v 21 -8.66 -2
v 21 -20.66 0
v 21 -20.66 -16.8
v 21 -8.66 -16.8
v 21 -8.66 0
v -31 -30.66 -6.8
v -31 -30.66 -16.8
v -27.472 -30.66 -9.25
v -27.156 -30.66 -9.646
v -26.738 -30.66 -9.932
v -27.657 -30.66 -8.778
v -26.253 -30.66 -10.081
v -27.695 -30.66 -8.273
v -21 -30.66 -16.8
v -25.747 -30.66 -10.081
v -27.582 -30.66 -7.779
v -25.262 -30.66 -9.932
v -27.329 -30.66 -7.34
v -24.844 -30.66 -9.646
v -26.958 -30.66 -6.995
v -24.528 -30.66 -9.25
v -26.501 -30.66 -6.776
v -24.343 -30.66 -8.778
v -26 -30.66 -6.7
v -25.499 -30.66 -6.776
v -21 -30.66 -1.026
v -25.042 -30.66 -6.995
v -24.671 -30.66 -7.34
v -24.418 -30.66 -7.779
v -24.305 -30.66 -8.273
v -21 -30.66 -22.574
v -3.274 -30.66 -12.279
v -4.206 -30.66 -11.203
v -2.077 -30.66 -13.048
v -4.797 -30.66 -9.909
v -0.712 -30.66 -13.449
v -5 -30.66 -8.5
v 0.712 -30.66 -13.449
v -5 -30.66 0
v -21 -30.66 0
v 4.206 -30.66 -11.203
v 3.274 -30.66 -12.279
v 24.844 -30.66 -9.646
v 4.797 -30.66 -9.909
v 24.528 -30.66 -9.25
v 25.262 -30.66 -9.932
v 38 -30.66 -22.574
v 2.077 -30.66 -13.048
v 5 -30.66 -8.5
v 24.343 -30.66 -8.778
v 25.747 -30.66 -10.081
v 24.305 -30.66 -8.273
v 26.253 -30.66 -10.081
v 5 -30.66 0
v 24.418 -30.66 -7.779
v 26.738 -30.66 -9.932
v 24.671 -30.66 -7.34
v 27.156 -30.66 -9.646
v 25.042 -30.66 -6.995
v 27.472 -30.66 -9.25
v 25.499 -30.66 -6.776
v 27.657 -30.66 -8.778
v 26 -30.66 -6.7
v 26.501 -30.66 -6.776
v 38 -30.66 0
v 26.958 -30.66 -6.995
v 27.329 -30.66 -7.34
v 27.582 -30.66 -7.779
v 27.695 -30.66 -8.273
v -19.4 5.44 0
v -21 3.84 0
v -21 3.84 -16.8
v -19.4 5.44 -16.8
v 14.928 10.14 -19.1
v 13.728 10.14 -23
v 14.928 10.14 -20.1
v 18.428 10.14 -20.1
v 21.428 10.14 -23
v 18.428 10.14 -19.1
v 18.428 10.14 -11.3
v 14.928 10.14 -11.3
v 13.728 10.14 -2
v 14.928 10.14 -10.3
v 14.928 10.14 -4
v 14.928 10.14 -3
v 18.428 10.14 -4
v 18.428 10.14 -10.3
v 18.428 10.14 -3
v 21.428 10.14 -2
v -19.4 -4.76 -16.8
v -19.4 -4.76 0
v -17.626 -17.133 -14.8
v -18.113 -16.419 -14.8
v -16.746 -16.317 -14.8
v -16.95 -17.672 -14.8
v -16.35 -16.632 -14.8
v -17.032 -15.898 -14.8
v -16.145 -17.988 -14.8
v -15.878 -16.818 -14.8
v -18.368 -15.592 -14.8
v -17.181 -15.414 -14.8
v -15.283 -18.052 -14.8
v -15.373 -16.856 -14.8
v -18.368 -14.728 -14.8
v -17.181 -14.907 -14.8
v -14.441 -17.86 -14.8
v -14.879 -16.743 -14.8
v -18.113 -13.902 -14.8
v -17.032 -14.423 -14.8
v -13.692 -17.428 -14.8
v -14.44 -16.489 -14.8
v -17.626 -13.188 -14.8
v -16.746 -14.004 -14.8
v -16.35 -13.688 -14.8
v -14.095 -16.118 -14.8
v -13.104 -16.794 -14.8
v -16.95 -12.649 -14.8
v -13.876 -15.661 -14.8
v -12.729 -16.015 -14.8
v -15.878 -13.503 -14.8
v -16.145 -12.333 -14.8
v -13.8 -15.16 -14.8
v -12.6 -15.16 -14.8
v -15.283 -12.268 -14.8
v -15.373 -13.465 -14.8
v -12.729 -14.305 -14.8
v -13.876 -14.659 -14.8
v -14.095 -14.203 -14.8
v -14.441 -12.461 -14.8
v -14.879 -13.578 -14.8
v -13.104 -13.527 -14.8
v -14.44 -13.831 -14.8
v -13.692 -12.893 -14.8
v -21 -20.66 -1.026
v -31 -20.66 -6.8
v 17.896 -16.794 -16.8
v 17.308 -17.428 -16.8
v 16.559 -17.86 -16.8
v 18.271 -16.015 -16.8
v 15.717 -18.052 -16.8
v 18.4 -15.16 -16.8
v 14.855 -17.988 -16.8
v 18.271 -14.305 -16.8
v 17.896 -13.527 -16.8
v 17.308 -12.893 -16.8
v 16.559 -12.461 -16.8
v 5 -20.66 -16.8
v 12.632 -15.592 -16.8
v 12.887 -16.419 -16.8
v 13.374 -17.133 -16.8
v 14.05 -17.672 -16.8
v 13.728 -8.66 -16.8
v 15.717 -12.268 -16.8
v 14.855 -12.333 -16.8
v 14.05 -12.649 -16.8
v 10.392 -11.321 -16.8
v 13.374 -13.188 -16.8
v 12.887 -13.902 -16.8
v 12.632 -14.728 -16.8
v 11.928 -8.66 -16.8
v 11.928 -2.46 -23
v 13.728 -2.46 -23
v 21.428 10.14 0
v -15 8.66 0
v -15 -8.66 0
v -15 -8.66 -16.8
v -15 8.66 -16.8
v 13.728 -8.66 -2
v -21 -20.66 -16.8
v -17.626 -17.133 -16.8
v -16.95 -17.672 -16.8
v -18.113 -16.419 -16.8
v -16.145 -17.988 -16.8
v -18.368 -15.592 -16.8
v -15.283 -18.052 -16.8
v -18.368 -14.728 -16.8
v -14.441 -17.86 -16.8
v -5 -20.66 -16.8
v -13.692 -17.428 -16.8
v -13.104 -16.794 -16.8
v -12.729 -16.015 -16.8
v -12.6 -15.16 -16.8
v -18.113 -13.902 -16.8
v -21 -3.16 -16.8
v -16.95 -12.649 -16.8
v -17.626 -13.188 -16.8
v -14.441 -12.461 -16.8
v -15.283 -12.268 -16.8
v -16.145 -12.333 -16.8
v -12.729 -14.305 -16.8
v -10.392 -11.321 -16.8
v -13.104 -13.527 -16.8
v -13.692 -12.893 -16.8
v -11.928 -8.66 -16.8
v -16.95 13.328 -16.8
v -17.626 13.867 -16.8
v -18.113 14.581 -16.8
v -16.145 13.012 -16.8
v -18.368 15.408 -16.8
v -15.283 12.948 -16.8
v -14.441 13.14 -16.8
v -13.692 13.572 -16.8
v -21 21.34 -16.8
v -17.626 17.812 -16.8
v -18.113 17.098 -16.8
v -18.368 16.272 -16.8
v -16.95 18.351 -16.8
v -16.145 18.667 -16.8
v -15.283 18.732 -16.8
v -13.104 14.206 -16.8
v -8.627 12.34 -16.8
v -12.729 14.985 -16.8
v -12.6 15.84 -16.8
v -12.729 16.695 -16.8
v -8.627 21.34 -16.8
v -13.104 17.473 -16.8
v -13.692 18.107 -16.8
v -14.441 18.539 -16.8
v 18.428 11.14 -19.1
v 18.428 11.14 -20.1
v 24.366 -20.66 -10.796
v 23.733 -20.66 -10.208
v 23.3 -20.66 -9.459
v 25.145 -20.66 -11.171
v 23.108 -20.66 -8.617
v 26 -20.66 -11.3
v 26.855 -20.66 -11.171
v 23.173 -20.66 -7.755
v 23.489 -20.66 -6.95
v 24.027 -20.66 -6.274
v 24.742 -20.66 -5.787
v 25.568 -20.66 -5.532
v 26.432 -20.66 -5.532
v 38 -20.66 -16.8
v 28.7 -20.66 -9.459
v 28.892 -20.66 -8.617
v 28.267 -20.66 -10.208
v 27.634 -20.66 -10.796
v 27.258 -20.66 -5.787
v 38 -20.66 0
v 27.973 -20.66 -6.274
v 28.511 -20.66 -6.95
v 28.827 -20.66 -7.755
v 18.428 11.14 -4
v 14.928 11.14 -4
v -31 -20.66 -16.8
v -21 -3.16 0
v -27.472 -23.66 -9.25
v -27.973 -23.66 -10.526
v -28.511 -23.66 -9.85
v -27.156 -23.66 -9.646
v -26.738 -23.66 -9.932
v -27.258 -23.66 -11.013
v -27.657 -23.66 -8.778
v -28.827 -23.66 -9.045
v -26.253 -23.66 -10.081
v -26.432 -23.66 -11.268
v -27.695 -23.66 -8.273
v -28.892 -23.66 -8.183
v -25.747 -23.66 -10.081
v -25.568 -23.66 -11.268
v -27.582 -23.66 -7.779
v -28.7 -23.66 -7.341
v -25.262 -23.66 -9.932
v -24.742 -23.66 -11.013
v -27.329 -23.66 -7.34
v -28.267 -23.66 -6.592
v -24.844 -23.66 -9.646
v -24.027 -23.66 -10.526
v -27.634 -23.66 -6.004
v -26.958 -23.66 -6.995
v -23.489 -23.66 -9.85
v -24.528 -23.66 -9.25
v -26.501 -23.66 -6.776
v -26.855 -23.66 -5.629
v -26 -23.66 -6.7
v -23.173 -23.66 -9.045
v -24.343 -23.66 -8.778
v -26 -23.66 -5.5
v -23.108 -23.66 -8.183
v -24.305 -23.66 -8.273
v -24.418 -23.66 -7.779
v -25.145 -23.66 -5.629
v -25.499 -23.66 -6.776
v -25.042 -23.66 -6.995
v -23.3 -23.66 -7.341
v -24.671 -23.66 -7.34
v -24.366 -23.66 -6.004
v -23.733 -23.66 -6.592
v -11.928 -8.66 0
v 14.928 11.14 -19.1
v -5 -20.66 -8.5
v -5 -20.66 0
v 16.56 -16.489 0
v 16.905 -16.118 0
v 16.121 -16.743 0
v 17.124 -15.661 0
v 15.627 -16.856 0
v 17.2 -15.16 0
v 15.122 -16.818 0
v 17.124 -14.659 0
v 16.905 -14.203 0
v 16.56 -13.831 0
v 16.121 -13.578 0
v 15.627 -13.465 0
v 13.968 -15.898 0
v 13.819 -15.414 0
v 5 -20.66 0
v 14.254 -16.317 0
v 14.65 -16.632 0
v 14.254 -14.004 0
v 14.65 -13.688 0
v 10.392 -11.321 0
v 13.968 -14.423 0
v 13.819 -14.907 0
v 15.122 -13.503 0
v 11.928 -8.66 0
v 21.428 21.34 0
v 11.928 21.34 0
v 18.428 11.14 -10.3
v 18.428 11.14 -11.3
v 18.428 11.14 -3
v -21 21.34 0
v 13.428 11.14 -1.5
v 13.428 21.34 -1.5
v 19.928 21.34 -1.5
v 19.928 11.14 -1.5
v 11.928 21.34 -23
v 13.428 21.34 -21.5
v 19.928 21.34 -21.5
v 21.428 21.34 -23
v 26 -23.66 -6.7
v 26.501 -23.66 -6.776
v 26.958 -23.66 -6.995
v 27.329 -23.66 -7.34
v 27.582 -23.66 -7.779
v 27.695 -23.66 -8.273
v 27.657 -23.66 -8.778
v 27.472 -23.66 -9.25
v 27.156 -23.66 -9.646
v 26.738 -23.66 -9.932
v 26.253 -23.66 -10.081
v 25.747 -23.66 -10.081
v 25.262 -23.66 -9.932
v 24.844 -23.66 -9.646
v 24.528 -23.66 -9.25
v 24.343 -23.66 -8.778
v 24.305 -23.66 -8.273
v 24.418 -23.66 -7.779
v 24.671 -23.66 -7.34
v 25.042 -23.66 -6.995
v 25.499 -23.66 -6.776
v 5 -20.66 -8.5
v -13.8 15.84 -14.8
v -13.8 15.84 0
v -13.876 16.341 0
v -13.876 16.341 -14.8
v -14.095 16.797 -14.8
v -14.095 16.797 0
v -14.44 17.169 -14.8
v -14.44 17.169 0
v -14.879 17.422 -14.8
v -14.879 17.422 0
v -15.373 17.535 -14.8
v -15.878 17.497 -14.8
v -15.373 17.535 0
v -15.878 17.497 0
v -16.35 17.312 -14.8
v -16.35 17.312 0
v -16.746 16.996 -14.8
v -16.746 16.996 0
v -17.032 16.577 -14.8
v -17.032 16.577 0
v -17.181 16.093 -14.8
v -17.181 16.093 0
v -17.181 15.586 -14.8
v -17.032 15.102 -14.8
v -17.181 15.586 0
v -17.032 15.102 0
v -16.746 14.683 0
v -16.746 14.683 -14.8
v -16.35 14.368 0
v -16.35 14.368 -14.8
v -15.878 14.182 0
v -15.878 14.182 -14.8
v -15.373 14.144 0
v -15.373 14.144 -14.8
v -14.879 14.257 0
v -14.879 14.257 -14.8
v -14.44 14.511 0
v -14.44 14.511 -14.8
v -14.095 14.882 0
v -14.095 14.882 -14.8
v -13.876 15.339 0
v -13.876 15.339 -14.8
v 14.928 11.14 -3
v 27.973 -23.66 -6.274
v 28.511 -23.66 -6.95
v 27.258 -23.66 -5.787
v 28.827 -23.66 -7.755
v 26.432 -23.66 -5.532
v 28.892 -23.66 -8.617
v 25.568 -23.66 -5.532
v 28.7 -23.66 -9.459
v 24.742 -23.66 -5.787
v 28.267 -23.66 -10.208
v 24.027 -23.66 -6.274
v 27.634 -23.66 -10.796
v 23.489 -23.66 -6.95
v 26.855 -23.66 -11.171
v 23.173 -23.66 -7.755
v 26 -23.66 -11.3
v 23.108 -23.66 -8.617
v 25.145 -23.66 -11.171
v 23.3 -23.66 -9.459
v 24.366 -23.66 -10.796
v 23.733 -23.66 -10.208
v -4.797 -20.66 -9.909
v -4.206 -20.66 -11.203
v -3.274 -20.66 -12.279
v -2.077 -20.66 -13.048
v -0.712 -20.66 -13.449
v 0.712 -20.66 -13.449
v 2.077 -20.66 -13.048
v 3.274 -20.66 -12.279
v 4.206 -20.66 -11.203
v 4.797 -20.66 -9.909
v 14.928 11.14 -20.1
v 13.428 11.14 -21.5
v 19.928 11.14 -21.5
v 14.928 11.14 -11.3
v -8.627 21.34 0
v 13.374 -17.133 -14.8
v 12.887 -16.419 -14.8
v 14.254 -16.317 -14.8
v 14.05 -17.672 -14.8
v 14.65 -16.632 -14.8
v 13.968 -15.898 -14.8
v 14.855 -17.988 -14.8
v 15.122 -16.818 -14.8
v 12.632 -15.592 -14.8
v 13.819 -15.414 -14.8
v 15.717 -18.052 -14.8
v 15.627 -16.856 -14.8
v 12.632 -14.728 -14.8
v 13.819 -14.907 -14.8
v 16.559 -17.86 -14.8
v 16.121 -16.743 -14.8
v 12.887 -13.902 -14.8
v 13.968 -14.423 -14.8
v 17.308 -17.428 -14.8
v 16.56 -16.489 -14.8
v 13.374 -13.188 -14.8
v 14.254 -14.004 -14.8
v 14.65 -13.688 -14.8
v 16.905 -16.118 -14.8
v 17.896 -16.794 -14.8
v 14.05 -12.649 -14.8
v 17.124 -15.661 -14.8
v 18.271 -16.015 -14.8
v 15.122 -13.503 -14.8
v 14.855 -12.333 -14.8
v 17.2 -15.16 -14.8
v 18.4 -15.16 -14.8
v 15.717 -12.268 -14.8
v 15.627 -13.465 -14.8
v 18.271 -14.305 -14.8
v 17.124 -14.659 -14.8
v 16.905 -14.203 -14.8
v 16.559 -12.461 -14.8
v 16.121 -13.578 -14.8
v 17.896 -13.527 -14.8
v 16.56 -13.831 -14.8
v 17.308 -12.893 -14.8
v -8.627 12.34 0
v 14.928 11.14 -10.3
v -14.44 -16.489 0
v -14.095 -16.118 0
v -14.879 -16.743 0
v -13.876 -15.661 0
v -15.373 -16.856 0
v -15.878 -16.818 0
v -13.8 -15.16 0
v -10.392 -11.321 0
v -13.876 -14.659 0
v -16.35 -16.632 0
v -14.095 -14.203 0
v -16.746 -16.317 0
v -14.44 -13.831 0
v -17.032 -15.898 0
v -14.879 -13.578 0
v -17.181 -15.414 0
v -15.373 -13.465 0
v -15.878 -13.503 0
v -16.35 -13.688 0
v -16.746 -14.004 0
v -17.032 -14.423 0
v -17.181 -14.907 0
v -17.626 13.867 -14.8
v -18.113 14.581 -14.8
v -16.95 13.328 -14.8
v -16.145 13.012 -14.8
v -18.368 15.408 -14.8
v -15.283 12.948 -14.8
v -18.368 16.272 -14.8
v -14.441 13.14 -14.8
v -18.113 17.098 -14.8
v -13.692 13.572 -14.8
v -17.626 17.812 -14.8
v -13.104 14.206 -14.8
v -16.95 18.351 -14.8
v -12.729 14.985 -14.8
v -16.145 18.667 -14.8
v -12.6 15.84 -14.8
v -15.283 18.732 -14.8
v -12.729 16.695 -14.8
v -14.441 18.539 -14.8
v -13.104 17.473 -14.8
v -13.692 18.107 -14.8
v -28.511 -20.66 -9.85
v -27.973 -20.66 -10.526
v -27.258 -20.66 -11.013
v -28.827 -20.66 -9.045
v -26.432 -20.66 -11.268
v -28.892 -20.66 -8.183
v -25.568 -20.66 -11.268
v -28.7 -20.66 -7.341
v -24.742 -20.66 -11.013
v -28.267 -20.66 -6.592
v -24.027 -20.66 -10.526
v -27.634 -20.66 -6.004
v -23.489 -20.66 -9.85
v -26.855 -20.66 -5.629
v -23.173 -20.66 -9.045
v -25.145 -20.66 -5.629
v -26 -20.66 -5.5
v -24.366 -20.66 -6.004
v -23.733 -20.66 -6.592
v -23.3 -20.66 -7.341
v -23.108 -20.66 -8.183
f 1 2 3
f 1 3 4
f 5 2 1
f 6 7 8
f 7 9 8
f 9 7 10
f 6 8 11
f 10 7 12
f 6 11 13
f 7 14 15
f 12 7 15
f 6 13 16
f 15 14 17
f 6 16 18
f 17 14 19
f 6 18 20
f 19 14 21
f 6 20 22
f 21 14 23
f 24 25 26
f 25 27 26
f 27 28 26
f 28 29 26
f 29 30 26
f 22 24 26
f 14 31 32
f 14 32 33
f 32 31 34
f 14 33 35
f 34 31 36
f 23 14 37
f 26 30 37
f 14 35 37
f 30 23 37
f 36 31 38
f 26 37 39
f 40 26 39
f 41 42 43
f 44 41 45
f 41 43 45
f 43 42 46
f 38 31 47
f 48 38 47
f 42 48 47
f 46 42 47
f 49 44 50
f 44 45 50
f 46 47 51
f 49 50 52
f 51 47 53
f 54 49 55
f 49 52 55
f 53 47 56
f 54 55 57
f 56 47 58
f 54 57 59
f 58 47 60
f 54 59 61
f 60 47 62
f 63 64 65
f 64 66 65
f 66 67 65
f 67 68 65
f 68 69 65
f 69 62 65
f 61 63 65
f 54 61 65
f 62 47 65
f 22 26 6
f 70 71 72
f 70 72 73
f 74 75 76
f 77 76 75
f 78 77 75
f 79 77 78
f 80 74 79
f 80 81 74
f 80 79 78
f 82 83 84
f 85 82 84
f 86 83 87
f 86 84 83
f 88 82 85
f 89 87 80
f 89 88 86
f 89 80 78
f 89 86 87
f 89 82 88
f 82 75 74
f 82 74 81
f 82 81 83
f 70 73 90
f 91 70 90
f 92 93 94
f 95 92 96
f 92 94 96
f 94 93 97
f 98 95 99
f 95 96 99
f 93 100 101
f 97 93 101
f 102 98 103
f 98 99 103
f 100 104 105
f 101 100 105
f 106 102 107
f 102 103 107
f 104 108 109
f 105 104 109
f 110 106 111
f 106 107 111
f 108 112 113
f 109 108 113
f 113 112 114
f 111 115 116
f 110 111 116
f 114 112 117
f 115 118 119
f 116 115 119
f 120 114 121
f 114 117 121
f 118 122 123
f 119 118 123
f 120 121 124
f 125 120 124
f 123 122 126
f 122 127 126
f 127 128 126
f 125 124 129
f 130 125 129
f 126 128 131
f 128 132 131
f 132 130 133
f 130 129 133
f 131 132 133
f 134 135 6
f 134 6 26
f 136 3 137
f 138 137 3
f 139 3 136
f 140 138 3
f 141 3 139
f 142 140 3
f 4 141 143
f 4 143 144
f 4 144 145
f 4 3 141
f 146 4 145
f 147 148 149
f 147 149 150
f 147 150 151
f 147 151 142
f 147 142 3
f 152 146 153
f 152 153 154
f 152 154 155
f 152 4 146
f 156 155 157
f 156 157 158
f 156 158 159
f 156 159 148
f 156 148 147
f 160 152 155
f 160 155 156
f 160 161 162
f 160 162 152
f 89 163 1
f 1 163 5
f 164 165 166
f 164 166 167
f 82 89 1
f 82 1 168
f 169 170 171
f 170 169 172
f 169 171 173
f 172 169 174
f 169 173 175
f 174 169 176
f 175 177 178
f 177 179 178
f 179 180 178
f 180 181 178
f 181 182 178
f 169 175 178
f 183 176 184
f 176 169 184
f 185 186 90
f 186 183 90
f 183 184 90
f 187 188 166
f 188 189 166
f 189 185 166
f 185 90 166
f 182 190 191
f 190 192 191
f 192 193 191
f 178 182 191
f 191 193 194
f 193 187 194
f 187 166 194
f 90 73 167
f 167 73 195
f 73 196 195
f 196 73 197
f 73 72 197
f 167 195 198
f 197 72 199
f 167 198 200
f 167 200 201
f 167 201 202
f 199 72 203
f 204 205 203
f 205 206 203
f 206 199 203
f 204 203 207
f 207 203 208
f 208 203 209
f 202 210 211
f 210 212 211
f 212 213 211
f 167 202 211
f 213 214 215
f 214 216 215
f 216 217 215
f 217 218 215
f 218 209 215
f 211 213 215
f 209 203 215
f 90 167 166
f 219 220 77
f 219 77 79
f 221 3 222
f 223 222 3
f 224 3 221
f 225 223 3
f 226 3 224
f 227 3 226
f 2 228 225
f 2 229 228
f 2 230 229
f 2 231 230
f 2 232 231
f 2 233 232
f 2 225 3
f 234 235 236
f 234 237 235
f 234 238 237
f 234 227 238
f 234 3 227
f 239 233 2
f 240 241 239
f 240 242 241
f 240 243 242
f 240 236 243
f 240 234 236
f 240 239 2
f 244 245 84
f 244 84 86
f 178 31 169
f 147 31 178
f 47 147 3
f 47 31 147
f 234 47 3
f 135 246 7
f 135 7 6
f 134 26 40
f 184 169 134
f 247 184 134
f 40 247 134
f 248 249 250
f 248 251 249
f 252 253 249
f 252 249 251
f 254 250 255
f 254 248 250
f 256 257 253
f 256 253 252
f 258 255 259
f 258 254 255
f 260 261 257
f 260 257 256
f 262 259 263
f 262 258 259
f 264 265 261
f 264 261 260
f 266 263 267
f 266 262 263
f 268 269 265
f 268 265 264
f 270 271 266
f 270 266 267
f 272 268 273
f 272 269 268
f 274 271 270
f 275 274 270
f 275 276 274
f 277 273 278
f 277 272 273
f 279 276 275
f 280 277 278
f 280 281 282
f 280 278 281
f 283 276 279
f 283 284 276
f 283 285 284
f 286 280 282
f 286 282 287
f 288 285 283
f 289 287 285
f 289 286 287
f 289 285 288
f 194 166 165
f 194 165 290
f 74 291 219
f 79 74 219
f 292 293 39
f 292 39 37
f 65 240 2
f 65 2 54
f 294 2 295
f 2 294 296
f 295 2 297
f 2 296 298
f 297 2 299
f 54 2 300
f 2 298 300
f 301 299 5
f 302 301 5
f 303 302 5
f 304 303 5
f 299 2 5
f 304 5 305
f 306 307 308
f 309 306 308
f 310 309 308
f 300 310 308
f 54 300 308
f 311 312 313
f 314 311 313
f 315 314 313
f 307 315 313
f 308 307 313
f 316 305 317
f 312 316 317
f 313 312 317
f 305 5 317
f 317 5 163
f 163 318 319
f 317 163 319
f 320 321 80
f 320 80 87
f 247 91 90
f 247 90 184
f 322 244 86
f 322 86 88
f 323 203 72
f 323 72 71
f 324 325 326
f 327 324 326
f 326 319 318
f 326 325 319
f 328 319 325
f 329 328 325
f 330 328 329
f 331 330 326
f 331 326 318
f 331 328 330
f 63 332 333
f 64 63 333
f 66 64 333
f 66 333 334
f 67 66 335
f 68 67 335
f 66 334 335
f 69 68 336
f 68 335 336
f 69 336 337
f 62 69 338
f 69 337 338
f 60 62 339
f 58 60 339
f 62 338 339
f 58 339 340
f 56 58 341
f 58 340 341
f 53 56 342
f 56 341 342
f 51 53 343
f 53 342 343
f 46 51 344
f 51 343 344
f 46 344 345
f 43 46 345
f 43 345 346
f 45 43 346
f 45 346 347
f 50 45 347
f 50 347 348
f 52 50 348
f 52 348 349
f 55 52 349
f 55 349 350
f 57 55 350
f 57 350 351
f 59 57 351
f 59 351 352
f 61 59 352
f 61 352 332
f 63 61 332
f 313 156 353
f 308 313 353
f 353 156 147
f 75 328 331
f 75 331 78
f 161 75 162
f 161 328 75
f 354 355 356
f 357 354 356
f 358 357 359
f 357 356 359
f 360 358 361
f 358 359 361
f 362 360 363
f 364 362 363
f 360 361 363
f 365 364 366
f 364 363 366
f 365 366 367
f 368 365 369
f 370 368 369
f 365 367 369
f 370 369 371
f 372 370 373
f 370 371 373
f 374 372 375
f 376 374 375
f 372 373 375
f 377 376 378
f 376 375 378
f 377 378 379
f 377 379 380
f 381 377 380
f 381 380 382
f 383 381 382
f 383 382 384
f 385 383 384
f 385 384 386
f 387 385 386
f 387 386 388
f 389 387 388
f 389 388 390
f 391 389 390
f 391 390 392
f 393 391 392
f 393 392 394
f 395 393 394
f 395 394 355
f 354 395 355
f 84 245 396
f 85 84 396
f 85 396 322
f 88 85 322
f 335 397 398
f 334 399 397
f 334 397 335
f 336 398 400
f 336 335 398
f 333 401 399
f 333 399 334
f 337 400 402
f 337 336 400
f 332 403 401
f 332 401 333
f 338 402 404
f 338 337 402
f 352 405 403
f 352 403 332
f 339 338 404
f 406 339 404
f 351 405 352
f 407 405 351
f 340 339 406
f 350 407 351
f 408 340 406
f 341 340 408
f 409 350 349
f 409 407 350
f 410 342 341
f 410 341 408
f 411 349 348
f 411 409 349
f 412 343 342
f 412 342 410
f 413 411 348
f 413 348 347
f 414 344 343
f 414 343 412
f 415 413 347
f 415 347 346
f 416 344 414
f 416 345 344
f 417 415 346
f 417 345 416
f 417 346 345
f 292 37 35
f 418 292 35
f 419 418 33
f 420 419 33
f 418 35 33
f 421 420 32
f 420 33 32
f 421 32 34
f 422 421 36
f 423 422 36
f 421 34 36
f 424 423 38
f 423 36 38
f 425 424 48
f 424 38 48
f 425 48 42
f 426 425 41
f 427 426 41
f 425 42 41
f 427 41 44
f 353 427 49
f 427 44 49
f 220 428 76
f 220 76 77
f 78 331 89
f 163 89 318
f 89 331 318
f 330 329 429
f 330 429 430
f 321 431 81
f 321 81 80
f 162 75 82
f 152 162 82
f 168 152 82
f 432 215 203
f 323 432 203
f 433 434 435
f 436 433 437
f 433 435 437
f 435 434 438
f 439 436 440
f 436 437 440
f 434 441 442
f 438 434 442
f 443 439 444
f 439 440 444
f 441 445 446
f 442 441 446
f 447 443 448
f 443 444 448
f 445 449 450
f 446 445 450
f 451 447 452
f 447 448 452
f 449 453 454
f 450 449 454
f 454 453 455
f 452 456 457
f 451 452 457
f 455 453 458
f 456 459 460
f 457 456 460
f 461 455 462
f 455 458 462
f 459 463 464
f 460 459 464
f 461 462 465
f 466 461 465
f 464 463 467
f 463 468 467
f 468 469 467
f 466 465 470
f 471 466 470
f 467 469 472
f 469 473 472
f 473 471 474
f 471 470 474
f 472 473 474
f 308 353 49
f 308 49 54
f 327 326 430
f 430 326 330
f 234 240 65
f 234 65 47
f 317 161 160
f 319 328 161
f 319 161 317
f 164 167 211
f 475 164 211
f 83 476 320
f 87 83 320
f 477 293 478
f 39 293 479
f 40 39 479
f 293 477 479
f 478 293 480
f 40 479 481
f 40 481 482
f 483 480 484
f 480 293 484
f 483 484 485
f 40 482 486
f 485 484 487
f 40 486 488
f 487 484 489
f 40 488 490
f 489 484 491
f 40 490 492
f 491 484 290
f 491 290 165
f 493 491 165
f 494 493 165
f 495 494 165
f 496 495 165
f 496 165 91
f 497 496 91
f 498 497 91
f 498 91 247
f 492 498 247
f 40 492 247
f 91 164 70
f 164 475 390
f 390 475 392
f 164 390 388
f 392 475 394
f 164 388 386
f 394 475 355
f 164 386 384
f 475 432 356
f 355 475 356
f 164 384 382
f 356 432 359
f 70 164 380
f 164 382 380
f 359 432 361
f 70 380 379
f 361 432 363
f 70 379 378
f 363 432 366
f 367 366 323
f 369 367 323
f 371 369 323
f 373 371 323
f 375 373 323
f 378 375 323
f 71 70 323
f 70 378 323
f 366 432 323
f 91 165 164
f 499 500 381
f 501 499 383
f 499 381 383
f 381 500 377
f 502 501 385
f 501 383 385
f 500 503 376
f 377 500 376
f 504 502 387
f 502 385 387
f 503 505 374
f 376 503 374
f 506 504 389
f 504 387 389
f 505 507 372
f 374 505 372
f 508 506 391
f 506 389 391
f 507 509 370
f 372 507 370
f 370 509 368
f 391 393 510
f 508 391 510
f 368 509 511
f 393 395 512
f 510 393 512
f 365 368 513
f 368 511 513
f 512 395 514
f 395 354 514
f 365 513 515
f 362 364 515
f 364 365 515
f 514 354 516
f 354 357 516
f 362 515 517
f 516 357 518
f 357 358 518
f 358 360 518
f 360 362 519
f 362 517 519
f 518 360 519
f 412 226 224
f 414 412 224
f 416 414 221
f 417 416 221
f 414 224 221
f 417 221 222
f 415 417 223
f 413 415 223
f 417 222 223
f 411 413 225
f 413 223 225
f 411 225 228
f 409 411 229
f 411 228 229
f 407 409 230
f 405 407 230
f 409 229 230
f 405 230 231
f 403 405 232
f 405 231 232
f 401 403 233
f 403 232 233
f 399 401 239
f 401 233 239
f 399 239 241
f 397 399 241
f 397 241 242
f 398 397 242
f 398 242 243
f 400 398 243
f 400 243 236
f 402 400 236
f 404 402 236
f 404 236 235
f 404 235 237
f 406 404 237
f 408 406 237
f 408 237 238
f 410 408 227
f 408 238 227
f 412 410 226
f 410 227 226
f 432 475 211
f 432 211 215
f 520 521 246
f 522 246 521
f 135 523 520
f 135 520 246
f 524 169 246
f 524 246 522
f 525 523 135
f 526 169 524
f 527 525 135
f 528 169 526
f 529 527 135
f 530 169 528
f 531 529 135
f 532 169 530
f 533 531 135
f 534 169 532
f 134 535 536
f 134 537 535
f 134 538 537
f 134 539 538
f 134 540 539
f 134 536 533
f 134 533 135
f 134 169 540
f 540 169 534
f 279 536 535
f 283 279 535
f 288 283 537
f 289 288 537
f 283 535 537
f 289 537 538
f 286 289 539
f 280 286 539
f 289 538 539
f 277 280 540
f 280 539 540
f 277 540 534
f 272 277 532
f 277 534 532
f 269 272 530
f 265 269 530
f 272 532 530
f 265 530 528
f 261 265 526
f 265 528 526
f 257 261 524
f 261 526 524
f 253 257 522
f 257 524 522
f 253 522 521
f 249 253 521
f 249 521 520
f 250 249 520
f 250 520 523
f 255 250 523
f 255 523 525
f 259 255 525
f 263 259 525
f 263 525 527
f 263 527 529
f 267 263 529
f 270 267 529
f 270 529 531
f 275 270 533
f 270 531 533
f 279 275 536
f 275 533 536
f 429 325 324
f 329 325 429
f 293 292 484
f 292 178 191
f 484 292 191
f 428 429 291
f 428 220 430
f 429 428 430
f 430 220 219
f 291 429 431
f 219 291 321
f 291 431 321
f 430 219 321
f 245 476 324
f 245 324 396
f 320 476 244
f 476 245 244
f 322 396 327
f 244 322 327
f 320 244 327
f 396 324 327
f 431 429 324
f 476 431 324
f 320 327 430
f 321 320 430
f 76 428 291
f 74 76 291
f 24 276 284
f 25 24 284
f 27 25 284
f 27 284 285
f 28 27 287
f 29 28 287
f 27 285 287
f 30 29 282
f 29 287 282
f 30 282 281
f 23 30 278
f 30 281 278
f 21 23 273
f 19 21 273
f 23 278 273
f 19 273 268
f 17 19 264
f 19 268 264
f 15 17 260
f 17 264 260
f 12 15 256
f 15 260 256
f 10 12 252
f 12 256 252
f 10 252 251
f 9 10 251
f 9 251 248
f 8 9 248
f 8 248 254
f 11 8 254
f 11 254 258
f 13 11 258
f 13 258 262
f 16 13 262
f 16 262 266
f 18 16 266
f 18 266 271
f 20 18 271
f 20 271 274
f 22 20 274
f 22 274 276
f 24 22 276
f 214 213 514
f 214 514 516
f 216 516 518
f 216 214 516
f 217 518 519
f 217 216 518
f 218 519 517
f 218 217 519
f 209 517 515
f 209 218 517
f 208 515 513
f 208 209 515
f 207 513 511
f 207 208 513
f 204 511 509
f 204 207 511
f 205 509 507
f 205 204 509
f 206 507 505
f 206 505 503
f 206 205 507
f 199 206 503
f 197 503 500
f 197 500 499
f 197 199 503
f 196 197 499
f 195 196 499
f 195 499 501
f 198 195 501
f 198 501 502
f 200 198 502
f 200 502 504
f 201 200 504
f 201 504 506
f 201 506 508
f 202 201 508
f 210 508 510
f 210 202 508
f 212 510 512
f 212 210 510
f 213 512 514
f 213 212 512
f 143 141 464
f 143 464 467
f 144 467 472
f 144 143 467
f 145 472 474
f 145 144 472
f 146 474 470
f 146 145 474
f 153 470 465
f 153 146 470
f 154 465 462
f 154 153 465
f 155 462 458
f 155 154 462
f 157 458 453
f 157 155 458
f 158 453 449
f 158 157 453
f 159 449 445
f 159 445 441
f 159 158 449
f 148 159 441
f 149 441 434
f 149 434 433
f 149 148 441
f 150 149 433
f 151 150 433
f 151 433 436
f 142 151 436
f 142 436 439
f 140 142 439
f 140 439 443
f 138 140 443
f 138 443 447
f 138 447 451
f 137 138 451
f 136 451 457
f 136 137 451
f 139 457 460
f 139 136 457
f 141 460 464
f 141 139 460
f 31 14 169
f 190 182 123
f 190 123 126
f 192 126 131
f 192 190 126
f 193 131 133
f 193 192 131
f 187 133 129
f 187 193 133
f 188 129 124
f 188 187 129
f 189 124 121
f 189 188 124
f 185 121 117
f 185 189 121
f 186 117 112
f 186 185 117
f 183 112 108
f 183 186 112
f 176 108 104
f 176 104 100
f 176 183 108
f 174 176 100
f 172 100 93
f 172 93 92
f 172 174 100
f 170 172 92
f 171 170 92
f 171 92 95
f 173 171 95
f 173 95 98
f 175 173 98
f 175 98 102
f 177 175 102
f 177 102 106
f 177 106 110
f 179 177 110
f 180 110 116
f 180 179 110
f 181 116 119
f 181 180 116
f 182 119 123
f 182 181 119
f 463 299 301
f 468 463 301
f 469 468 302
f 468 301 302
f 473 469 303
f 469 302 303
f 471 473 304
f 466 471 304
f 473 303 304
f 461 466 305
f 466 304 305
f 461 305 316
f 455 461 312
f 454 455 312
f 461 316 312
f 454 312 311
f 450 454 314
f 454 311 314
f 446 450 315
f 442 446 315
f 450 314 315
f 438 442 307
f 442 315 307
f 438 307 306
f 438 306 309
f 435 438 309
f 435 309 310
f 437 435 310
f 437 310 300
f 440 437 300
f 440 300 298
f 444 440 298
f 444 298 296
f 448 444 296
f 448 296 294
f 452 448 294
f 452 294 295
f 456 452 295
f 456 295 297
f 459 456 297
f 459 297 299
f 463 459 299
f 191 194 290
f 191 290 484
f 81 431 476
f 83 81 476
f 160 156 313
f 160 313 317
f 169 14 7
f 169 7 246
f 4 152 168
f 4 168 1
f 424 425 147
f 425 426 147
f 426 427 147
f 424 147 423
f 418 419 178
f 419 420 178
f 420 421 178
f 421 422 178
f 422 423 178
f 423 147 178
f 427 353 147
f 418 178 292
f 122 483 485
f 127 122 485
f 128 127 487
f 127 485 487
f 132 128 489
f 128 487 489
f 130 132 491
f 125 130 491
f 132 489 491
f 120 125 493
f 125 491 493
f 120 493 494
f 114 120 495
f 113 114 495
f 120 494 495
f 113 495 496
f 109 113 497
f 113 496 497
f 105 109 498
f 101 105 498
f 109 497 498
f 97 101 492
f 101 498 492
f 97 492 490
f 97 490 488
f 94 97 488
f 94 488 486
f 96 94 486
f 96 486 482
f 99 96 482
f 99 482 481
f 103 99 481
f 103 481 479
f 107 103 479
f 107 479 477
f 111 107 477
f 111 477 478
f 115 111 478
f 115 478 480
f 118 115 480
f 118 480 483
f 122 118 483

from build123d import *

# Parameters (mm, degrees)
SKETCH1_R                       = 1.7
BOSS_EXTRUDE1_DEPTH             = 16.8
BOSS_EXTRUDE2_DEPTH             = 17
BOSS_EXTRUDE2_DEPTH_BACK        = 42
SKETCH3_W                       = 16.8
SKETCH3_H                       = 10
BOSS_EXTRUDE3_DEPTH             = 10
SKETCH4_R                       = 1.7
CUT_EXTRUDE1_DEPTH              = 11
SKETCH4_3_R                     = 2.9
SKETCH4_3_R_2                   = 1.7
CUT_EXTRUDE2_DEPTH              = 3
CUT_EXTRUDE3_START              = -16.8
SKETCH6_R                       = 2.9
CUT_EXTRUDE3_DEPTH              = 2
CUT_EXTRUDE4_DEPTH              = 11
SKIZZE1_R                       = 5
SCHNITT_LINEAR_AUSTRAGEN1_DEPTH = 53
SCHNITT_LINEAR_AUSTRAGEN2_DEPTH = 17.8
AUFSATZ_LINEAR_AUSTRAGEN1_DEPTH = 16.8
SCHNITT_LINEAR_AUSTRAGEN3_DEPTH = 11
SKETCH13_W                      = 9.5
SKETCH13_H                      = 23
SKETCH13_W_2                    = 6.5
SKETCH13_H_2                    = 20
BOSS_EXTRUDE7_DEPTH             = 10.2
SKETCH14_W                      = 9.5
SKETCH14_H                      = 23
SKETCH14_W_2                    = 3.5
SKETCH14_H_2                    = 1
BOSS_EXTRUDE8_DEPTH             = 1
BOSS_EXTRUDE9_DEPTH             = 2
BOSS_EXTRUDE10_DEPTH            = 1.8
CUT_EXTRUDE10_DEPTH             = 17.8


with BuildPart() as part:
    # Sketch1 → Boss-Extrude1 (new body)
    with BuildSketch(Plane.XY):
        Polygon((-21, 21.339745962), (-21, -20.660254038), (21, -20.660254038), (21, -8.660254038), (15, -8.660254038), (0, -17.320508076), (-15, -8.660254038), (-15, 8.660254038), (-8.626933041, 12.339745962), (-8.626933041, 21.339745962), align=None)
        with Locations((-15.5, -15.160254038)):
            Circle(SKETCH1_R, mode=Mode.SUBTRACT)
        with Locations((15.5, -15.160254038)):
            Circle(SKETCH1_R, mode=Mode.SUBTRACT)
        with Locations((-15.5, 15.839745962)):
            Circle(SKETCH1_R, mode=Mode.SUBTRACT)
    extrude(amount=-BOSS_EXTRUDE1_DEPTH)



with BuildPart() as body_2:
    # Sketch2 → Boss-Extrude2 (new body, two sides)
    with BuildSketch(Plane(origin=(21, 0, 0), x_dir=(0, 0, -1), z_dir=(1, 0, 0))) as boss_extrude2_sk:
        Polygon((0, -20.660254038), (0, -30.660254038), (22.573502692, -30.660254038), (16.8, -20.660254038), align=None)
    extrude(amount=BOSS_EXTRUDE2_DEPTH)
    extrude(boss_extrude2_sk.sketch, amount=-BOSS_EXTRUDE2_DEPTH_BACK)


with BuildPart() as part_1:
    add(part.part)

    add(body_2.part)  # Boss-Extrude3 merges body 2
    # Sketch3 → Boss-Extrude3 (add)
    with BuildSketch(Plane.ZY.offset(21)):
        with Locations((-8.4, -25.660254038)):
            Rectangle(SKETCH3_W, SKETCH3_H)
    extrude(amount=BOSS_EXTRUDE3_DEPTH)

    # Sketch4 → Cut-Extrude1 (cut, through all)
    with BuildSketch(Plane(origin=(0, -20.660254038, 0), x_dir=(1, 0, 0), z_dir=(0, 1, 0))):
        with Locations(Location((-26, 8.4, 0), (0, 0, 270))):  # turned: the seam where the file's is
            Circle(SKETCH4_R)
        with Locations(Location((26, 8.4, 0), (0, 0, 270))):  # turned: the seam where the file's is
            Circle(SKETCH4_R)
    extrude(amount=-CUT_EXTRUDE1_DEPTH, mode=Mode.SUBTRACT)

    # Sketch4_3 → Cut-Extrude2 (cut)
    with BuildSketch(Plane(origin=(0, -20.660254038, 0), x_dir=(1, 0, 0), z_dir=(0, 1, 0))):
        with Locations(Location((-26, 8.4, 0), (0, 0, 270))):  # turned: the seam where the file's is
            Circle(SKETCH4_3_R)
        with Locations(Location((-26, 8.4, 0), (0, 0, 270))):  # turned: the seam where the file's is
            Circle(SKETCH4_3_R_2, mode=Mode.SUBTRACT)
        with Locations(Location((26, 8.4, 0), (0, 0, 90))):  # turned: the seam where the file's is
            Circle(SKETCH4_3_R)
        with Locations(Location((26, 8.4, 0), (0, 0, 270))):  # turned: the seam where the file's is
            Circle(SKETCH4_3_R_2, mode=Mode.SUBTRACT)
    extrude(amount=-CUT_EXTRUDE2_DEPTH, mode=Mode.SUBTRACT)

    # Sketch6 → Cut-Extrude3 (cut)
    with BuildSketch(Plane.XY.offset(CUT_EXTRUDE3_START)):
        with Locations((-15.5, 15.839745962)):
            Circle(SKETCH6_R)
        with Locations((-15.5, -15.160254038)):
            Circle(SKETCH6_R)
        with Locations((15.5, -15.160254038)):
            Circle(SKETCH6_R)
    extrude(amount=CUT_EXTRUDE3_DEPTH, mode=Mode.SUBTRACT)

    # Sketch5 → Cut-Extrude4 (cut, through all)
    with BuildSketch(Plane(origin=(0, -20.660254038, 0), x_dir=(1, 0, 0), z_dir=(0, 1, 0))):
        Polygon((-31, 0), (-31, 6.8), (-21, 1.026497308), (-21, 0), align=None)
    extrude(amount=-CUT_EXTRUDE4_DEPTH, mode=Mode.SUBTRACT)

    # Skizze1 → Schnitt-Linear austragen1 (cut, through all)
    with BuildSketch(Plane.XZ.offset(30.660254038)):
        with Locations((0, -8.5)):
            Circle(SKIZZE1_R)
    extrude(amount=-SCHNITT_LINEAR_AUSTRAGEN1_DEPTH, mode=Mode.SUBTRACT)

    # Skizze2 → Schnitt-Linear austragen2 (cut, through all)
    with BuildSketch(Plane(origin=(0, 0, -16.8), x_dir=(-1, 0, 0), z_dir=(0, 0, -1))):
        Polygon((-5, -20.660254038), (5, -20.660254038), (10.392304845, -11.320508076), (0, -17.320508076), (-10.392304845, -11.320508076), align=None)
    extrude(amount=-SCHNITT_LINEAR_AUSTRAGEN2_DEPTH, mode=Mode.SUBTRACT)

    # Skizze2_3 → Aufsatz-Linear austragen1 (add)
    with BuildSketch(Plane(origin=(0, 0, -16.8), x_dir=(-1, 0, 0), z_dir=(0, 0, -1))):
        Polygon((-15, -8.660254038), (-10.392304845, -11.320508076), (-11.92820323, -8.660254038), align=None)
        Polygon((11.92820323, -8.660254038), (10.392304845, -11.320508076), (15, -8.660254038), align=None)
    extrude(amount=-AUFSATZ_LINEAR_AUSTRAGEN1_DEPTH)

    # Skizze3 → Schnitt-Linear austragen3 (cut, through all)
    with BuildSketch(Plane(origin=(0, -20.660254038, 0), x_dir=(1, 0, 0), z_dir=(0, 1, 0))):
        with BuildLine():
            Line((5, 0), (-5, 0))
            Line((-5, 0), (-5, 8.5))
            ThreePointArc((-5, 8.5), (0, 3.5), (5, 8.5))
            Line((5, 8.5), (5, 0))
        make_face()
    extrude(amount=-SCHNITT_LINEAR_AUSTRAGEN3_DEPTH, mode=Mode.SUBTRACT)



with BuildPart() as body_2_2:
    # Sketch13 → Boss-Extrude7 (new body)
    with BuildSketch(Plane(origin=(0, 21.339745962, 0), x_dir=(1, 0, 0), z_dir=(0, 1, 0))):
        with Locations((16.67820323, 11.5)):
            Rectangle(SKETCH13_W, SKETCH13_H)
        with Locations((16.67820323, 11.5)):
            Rectangle(SKETCH13_W_2, SKETCH13_H_2, mode=Mode.SUBTRACT)
    extrude(amount=-BOSS_EXTRUDE7_DEPTH)

    # Sketch14 → Boss-Extrude8 (add)
    with BuildSketch(Plane.XZ.offset(-11.139745962)):
        with Locations((16.67820323, -11.5)):
            Rectangle(SKETCH14_W, SKETCH14_H)
        with Locations((16.67820323, -19.6)):
            Rectangle(SKETCH14_W_2, SKETCH14_H_2, mode=Mode.SUBTRACT)
        with Locations((16.67820323, -10.8)):
            Rectangle(SKETCH14_W_2, SKETCH14_H_2, mode=Mode.SUBTRACT)
        with Locations((16.67820323, -3.5)):
            Rectangle(SKETCH14_W_2, SKETCH14_H_2, mode=Mode.SUBTRACT)
    extrude(amount=BOSS_EXTRUDE8_DEPTH)


with BuildPart() as part_2:
    add(part_1.part)

    add(body_2_2.part)  # Boss-Extrude9 merges body 2 2
    # Sketch15 → Boss-Extrude9 (add)
    with BuildSketch(Plane.XY):
        Polygon((21.42820323, 10.139745962), (21, -8.660254038), (11.92820323, -8.660254038), (11.92820323, 10.139745962), align=None)
    extrude(amount=-BOSS_EXTRUDE9_DEPTH)

    # Sketch16 → Boss-Extrude10 (add)
    with BuildSketch(Plane.ZY.offset(-11.92820323)):
        Polygon((-2, 10.139745962), (-23, 10.139745962), (-23, -2.460254038), (-16.8, -8.660254038), (-2, -8.660254038), align=None)
    extrude(amount=-BOSS_EXTRUDE10_DEPTH)

    # Sketch18 → Cut-Extrude10 (cut, through all)
    with BuildSketch(Plane(origin=(0, 0, -16.8), x_dir=(-1, 0, 0), z_dir=(0, 0, -1))):
        Polygon((21, 0.339745962), (21, 3.839745962), (19.4, 5.439745962), (19.4, -4.760254038), (21, -3.160254038), align=None)
    extrude(amount=-CUT_EXTRUDE10_DEPTH, mode=Mode.SUBTRACT)


solid = part_2.part
